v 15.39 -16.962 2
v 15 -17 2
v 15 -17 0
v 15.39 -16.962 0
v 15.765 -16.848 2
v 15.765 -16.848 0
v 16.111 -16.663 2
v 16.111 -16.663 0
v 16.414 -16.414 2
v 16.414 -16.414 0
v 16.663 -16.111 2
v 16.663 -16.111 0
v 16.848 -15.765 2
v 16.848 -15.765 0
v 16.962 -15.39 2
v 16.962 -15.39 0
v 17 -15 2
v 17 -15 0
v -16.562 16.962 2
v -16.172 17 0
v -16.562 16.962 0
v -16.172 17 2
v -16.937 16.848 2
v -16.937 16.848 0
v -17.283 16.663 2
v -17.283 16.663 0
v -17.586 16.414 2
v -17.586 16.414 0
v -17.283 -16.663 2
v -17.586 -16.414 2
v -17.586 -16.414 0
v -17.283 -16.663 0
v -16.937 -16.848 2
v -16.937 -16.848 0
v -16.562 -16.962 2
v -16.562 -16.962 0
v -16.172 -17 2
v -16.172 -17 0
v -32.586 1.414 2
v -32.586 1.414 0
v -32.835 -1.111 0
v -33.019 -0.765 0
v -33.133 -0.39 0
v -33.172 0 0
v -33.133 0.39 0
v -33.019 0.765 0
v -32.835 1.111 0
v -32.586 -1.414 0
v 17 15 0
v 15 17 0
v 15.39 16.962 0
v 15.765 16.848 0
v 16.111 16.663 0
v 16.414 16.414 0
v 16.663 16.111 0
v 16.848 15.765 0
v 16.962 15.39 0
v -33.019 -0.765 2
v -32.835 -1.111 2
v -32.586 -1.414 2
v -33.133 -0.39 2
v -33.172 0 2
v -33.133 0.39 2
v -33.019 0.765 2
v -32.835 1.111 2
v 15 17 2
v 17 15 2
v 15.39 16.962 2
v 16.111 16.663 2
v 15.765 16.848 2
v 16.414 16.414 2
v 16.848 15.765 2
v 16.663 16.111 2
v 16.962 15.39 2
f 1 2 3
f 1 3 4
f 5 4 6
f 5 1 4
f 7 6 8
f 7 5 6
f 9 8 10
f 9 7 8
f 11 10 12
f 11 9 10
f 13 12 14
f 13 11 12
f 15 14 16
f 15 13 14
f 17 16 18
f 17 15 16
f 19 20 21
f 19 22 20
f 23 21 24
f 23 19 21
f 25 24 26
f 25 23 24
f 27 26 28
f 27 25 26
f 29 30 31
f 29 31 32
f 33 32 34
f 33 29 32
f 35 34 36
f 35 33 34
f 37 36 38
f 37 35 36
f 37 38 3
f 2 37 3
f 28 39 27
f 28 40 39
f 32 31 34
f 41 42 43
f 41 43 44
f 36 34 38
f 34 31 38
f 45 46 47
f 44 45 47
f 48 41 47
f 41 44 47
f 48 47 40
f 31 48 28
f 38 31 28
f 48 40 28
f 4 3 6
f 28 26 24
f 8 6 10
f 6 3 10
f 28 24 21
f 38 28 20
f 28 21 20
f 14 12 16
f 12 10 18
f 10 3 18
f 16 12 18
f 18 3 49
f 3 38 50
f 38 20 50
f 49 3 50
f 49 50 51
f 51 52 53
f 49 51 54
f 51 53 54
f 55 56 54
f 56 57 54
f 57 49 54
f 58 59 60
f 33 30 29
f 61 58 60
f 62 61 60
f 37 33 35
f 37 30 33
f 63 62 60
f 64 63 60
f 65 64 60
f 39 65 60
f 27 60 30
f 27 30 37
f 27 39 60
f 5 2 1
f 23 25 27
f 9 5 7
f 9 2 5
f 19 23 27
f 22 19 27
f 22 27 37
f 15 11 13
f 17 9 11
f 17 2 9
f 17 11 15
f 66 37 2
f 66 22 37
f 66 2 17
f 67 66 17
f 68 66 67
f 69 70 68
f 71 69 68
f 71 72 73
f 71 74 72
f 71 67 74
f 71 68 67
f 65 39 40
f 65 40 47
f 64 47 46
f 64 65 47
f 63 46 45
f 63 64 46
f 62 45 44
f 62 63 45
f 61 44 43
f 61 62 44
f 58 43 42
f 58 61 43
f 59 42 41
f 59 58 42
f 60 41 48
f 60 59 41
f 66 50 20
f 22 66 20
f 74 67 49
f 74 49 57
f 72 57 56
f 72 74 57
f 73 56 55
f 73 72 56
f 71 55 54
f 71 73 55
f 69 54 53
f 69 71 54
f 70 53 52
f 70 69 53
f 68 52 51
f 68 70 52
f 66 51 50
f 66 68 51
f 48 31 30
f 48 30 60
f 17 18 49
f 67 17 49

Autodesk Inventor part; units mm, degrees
ref_plane "YZ Plane" through (0, 0, 0) normal (1, 0, 0) x (0, 1, 0)
ref_plane "XZ Plane" through (0, 0, 0) normal (0, 1, 0) x (-1, 0, 0)
ref_plane "XY Plane" through (0, 0, 0) normal (0, 0, 1) x (1, 0, 0)
sketch "Sketch1" plane through (0, 0, 0) normal (0, 0, 1) x (1, 0, 0)
  line L0 (-17, -17) -> (17, -17)
  line L1 (17, -17) -> (17, 17)
  line L2 (17, 17) -> (-17, 17)
  line L3 (-17, 17) -> (-17, -17)
  line L4 (-17, -17) -> (17, 17) construction
  line L5 (17, -17) -> (-17, 17) construction
  line L6 (-17, -17) -> (-34, 0)
  line L7 (-34, 0) -> (-17, 17)
  point P0 (0, 0)
  point P1 (-17, 0)
  dimension "d154" = 34
  dimension "d155" = 34
  dimension "d180" = 17
extrude "Plate5" add sketch "Sketch1" along normal blind 2
fillet "Corner Round1" radius 2 5 edges at (17, 17, 1) (-17, 17, 1) (-17, -17, 1) (17, -17, 1) (-34, 0, 1)
properties part number "PRS 1200-52-03 FDS 1000 CUP 1" material "Stainless Steel"
